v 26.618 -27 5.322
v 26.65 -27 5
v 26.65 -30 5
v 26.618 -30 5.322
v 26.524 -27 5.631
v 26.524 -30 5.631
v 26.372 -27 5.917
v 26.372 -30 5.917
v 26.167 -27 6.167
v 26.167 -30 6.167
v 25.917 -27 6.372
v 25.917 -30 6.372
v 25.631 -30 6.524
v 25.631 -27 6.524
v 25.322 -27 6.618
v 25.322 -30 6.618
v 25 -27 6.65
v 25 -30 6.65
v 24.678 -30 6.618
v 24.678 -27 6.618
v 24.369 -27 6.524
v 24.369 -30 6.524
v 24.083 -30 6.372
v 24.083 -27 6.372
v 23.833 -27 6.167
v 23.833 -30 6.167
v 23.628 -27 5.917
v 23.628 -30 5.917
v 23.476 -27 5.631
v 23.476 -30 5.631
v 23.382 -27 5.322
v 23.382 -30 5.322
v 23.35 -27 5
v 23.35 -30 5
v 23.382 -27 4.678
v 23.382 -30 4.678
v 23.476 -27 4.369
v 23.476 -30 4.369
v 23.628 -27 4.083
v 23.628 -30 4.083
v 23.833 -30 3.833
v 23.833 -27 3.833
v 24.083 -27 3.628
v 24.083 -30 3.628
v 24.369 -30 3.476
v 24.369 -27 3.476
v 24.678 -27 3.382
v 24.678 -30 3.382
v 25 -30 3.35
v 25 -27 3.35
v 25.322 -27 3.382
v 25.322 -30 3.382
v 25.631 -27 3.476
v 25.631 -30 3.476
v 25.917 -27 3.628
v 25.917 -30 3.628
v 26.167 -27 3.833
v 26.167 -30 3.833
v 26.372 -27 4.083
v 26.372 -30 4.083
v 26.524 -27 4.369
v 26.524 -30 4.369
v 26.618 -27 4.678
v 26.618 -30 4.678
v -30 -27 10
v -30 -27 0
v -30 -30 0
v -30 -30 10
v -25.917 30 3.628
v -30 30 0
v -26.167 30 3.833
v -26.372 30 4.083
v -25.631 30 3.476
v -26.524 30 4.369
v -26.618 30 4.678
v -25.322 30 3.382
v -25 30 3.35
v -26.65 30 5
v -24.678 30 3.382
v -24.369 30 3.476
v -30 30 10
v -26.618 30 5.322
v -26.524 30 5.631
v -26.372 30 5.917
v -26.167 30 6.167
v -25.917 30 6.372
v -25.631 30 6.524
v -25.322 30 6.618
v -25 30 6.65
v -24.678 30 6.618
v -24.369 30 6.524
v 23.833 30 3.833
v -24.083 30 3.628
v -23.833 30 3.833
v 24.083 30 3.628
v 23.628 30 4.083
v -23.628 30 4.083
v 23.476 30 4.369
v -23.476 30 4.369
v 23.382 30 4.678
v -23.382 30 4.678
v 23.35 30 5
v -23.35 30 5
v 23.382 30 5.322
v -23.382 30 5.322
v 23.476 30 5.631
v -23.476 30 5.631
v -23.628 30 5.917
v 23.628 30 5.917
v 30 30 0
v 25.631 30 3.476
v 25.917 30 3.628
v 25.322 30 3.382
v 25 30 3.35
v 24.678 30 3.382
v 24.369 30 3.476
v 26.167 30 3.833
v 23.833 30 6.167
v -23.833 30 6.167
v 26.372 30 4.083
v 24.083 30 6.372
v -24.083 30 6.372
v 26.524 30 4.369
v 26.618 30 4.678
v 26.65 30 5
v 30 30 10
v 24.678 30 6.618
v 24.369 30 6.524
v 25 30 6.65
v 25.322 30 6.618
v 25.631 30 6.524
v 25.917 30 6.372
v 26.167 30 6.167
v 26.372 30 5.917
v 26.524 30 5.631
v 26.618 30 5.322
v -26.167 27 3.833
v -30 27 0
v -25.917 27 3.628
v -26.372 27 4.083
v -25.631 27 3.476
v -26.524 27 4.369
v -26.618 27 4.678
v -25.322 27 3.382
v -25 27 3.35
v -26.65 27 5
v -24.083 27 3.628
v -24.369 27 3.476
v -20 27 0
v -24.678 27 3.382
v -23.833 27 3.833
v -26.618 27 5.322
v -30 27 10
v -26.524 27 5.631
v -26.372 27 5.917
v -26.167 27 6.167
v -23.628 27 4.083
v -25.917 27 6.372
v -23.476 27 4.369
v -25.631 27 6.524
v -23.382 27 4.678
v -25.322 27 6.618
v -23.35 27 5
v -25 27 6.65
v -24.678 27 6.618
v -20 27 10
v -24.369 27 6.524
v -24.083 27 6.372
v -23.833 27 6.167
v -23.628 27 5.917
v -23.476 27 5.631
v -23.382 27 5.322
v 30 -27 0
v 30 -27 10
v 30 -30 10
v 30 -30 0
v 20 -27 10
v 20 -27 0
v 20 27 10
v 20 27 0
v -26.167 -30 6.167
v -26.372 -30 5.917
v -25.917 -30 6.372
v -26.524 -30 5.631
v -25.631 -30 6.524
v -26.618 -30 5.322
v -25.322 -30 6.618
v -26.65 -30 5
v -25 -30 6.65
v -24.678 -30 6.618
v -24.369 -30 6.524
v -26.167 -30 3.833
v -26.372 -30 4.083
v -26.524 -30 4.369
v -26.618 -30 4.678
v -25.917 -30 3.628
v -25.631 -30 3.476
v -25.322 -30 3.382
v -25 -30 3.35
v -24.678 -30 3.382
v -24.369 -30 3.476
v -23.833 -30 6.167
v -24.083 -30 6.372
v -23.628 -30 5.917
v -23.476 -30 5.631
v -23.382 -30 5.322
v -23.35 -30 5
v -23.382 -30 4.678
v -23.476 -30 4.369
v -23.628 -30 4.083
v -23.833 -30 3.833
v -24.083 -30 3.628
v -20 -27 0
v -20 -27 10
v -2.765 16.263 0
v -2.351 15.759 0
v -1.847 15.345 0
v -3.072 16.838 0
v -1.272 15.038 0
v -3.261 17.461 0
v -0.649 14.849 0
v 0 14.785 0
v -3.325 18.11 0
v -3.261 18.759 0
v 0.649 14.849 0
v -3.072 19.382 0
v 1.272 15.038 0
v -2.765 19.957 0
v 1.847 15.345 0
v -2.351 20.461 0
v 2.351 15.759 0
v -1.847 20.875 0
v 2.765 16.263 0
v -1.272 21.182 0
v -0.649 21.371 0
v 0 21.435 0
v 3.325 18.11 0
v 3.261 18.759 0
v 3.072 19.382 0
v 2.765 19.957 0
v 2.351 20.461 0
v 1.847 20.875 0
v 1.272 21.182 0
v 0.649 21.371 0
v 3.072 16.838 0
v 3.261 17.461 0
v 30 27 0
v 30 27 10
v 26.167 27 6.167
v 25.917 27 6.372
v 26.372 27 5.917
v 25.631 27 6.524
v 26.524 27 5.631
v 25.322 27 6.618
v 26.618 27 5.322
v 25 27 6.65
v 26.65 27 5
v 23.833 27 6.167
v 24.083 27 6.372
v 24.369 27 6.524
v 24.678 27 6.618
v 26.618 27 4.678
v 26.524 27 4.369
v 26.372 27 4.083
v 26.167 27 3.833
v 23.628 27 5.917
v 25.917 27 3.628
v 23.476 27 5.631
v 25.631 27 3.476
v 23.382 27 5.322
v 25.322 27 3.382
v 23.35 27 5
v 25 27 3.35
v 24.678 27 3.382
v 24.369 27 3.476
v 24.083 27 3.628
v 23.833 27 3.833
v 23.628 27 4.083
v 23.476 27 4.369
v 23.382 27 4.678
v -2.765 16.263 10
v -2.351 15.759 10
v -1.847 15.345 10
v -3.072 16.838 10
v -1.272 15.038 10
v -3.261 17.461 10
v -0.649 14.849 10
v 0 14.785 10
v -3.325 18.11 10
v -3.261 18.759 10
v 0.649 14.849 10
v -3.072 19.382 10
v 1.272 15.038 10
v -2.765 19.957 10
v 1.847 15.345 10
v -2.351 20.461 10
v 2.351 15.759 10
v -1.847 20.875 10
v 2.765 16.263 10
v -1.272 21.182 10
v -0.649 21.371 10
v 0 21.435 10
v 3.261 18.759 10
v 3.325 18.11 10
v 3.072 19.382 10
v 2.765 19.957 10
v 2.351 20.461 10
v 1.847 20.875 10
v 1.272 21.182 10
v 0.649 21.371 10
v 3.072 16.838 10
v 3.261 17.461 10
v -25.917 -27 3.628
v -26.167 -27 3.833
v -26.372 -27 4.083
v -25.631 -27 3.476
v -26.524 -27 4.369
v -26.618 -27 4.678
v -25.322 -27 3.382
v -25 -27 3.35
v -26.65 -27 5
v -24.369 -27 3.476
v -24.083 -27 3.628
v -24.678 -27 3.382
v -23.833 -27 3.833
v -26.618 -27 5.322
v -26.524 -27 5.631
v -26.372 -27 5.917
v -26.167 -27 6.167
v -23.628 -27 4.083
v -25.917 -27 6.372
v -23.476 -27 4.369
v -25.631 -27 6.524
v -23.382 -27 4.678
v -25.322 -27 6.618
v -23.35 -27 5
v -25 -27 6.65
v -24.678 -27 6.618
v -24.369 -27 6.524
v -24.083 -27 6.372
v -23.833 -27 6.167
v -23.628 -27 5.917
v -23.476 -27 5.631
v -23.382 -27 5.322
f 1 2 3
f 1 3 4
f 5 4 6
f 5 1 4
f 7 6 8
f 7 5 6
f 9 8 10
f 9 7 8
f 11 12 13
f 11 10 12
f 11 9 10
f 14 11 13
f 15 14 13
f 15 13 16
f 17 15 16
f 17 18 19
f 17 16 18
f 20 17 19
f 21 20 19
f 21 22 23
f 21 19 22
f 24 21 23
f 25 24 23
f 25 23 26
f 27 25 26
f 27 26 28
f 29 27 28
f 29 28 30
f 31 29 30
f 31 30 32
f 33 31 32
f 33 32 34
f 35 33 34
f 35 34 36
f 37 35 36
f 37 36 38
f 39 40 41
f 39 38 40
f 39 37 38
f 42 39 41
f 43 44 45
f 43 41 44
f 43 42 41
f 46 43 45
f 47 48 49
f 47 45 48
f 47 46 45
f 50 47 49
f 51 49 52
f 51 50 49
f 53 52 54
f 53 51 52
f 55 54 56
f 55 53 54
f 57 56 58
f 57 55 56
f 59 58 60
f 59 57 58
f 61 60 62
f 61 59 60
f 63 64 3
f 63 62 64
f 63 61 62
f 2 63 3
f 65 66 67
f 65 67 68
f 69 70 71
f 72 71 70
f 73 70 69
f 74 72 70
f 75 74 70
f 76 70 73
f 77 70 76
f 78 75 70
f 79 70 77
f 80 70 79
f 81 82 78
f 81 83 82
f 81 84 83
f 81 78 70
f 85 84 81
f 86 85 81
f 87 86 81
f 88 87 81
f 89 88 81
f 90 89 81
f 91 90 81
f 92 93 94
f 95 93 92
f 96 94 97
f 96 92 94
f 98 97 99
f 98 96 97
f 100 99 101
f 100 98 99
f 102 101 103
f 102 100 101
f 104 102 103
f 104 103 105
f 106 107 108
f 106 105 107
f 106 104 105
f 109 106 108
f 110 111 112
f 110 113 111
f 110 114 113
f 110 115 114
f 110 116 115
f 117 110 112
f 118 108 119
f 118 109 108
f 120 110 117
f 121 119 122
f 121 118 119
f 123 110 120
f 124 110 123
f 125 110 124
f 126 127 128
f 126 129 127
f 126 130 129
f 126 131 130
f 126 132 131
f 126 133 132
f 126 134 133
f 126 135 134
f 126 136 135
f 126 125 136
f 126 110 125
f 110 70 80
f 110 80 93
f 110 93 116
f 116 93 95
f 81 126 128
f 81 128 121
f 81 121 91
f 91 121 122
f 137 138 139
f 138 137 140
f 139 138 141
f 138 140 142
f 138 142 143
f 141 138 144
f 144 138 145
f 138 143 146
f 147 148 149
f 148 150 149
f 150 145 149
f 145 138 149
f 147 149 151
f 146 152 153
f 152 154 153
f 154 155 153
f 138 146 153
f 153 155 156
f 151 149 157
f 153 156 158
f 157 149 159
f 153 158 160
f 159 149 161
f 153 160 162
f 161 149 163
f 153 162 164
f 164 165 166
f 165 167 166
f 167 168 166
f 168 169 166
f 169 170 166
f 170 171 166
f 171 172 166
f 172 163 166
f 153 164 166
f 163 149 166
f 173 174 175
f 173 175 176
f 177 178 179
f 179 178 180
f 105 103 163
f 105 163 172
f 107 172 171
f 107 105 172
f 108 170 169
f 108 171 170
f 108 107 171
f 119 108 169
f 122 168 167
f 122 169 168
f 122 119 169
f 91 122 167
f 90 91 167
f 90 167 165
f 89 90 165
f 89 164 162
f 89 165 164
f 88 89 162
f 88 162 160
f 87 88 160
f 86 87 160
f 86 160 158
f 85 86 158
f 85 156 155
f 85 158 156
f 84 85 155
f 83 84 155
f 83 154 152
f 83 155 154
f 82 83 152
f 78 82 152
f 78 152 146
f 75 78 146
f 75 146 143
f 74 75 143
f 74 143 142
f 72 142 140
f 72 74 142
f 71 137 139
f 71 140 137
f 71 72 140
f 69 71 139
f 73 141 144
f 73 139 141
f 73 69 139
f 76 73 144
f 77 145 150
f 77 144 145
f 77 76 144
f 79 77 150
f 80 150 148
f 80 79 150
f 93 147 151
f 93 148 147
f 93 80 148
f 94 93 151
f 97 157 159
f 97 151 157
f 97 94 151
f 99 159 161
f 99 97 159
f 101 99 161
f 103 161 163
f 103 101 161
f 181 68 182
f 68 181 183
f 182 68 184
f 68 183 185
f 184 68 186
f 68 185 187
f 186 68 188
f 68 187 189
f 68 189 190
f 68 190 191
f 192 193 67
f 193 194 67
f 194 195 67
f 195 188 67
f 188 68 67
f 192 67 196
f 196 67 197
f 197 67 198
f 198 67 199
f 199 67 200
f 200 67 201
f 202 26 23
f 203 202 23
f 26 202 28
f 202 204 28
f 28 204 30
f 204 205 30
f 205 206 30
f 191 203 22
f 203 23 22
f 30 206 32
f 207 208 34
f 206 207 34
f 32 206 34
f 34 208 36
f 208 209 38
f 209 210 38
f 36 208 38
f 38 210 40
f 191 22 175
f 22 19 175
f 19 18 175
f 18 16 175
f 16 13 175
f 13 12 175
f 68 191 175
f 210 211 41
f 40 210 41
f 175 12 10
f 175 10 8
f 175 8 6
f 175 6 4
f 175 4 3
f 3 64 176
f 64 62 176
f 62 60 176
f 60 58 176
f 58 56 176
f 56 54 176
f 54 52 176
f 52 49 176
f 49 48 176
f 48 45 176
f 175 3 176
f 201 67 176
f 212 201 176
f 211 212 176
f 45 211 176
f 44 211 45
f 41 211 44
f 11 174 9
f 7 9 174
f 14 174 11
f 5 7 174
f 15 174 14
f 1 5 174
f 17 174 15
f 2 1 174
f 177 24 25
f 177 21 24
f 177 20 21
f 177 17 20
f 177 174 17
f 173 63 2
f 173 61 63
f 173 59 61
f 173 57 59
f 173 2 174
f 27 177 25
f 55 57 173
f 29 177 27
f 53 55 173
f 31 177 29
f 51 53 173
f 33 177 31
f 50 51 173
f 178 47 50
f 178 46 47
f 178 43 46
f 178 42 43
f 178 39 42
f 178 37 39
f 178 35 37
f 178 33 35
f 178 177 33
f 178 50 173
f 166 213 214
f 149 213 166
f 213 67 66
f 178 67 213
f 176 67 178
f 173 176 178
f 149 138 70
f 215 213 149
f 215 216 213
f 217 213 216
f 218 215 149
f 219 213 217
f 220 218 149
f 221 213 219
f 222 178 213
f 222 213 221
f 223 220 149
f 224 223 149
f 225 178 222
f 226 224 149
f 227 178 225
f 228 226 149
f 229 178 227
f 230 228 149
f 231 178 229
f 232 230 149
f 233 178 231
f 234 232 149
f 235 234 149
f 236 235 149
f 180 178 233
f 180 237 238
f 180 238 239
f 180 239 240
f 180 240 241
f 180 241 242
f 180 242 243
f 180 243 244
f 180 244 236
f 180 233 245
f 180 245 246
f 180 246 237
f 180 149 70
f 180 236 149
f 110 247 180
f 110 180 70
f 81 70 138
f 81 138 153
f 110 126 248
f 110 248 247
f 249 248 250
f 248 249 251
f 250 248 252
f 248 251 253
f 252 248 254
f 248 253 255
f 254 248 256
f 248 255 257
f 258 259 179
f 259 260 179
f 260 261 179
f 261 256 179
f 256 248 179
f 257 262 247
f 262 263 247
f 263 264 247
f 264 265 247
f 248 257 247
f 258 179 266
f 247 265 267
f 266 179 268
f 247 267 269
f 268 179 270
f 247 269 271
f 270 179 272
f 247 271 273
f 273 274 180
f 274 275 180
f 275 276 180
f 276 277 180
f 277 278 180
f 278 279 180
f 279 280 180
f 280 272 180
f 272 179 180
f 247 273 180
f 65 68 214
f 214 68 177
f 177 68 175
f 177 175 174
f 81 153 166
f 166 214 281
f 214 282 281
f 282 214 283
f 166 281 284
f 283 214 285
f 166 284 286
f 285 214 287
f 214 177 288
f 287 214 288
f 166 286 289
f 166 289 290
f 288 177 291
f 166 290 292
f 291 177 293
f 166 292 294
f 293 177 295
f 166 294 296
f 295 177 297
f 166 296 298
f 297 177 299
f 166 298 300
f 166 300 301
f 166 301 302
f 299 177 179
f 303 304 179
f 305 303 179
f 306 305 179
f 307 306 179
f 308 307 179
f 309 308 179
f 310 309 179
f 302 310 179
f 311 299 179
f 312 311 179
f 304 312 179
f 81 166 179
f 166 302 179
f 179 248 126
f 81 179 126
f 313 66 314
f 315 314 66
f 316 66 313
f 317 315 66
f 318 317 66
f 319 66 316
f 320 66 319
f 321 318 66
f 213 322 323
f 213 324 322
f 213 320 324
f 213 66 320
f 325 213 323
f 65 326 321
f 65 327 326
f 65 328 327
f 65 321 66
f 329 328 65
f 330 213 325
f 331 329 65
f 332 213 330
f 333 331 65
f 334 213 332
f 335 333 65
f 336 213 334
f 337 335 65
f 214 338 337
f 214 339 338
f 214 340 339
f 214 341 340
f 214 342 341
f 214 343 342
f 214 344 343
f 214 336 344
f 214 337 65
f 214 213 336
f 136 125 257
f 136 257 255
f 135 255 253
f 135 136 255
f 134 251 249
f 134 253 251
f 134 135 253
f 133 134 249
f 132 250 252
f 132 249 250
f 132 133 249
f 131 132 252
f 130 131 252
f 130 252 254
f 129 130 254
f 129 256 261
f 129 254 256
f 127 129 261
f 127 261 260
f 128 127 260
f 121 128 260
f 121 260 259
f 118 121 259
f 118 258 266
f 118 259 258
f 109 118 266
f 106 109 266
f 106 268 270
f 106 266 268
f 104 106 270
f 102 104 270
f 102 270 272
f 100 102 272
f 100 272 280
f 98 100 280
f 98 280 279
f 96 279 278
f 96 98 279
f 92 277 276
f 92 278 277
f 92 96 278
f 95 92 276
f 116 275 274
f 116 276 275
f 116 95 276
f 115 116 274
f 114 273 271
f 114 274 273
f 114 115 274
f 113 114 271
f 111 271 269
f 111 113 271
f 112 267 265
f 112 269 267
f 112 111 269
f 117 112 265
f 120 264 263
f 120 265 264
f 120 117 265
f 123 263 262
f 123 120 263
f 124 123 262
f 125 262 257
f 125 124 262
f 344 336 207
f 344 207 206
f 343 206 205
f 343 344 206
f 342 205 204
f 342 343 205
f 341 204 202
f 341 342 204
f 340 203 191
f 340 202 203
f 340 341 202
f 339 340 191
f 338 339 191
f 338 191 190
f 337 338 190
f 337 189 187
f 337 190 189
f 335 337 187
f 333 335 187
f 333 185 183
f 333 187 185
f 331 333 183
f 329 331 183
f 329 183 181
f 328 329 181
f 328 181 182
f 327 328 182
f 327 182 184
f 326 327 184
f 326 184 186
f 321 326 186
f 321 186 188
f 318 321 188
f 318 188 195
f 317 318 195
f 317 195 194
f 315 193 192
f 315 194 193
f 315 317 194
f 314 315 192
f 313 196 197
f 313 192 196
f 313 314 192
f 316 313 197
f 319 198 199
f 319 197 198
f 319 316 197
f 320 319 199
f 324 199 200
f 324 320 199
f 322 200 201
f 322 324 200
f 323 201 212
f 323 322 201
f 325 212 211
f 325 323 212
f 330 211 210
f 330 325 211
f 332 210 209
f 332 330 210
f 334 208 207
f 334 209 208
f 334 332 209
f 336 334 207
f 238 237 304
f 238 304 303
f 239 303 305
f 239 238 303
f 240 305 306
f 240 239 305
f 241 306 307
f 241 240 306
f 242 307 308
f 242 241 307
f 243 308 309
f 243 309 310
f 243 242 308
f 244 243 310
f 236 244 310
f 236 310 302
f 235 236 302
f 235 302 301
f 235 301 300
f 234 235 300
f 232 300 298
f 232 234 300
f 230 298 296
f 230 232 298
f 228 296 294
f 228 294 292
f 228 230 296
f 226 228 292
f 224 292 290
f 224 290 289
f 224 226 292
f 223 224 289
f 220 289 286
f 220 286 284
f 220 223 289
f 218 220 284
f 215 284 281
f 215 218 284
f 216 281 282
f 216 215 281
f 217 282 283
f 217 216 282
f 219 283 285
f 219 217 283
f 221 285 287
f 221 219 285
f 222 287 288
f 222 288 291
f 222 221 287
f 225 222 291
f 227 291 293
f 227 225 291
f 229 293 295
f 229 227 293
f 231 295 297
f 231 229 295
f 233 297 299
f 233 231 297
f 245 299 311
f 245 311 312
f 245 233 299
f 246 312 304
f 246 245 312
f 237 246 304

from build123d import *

# Parameters (mm, degrees)
SKETCH1_W                    = 40
SKETCH1_H                    = 60
SKETCH1_R                    = 3.325
BOSS_EXTRUDE1_DEPTH          = 10
ESQUISSE1_W                  = 10
ESQUISSE1_H                  = 3
BOSS_EXTRU_1_DEPTH           = 10
ESQUISSE2_W                  = 10
ESQUISSE2_H                  = 3
BOSS_EXTRU_2_DEPTH           = 10
ENL_V_MAT_EXTRU_1_DEPTH      = 66.184353951
ENL_V_MAT_EXTRU_1_DEPTH_BACK = 66.184353951
ESQUISSE3_R                  = 1.65


with BuildPart() as part:
    # Sketch1 → Boss-Extrude1 (new body)
    with BuildSketch(Plane.XY):
        Rectangle(SKETCH1_W, SKETCH1_H)
        with Locations((0, 18.11)):
            Circle(SKETCH1_R, mode=Mode.SUBTRACT)
    extrude(amount=BOSS_EXTRUDE1_DEPTH)

    # Esquisse1 → Boss.-Extru.1 (add)
    with BuildSketch(Plane(origin=(20, 0, 0), x_dir=(0, 0, -1), z_dir=(1, 0, 0))):
        with Locations((-5, 28.5)):
            Rectangle(ESQUISSE1_W, ESQUISSE1_H)
        with Locations((-5, -28.5)):
            Rectangle(ESQUISSE1_W, ESQUISSE1_H)
    extrude(amount=BOSS_EXTRU_1_DEPTH)

    # Esquisse2 → Boss.-Extru.2 (add)
    with BuildSketch(Plane.ZY.offset(20)):
        with Locations((5, 28.5)):
            Rectangle(ESQUISSE2_W, ESQUISSE2_H)
        with Locations((5, -28.5)):
            Rectangle(ESQUISSE2_W, ESQUISSE2_H)
    extrude(amount=BOSS_EXTRU_2_DEPTH)

    # Esquisse3 → Enlèv. mat.-Extru.1 (cut, two sides: drawn at the far end of the back side and taken through both)
    with BuildSketch(Plane.XZ.offset(-27).offset(-ENL_V_MAT_EXTRU_1_DEPTH_BACK)):
        with Locations((-25, 5)):
            Circle(ESQUISSE3_R)
        with Locations((25, 5)):
            Circle(ESQUISSE3_R)
    extrude(amount=ENL_V_MAT_EXTRU_1_DEPTH + ENL_V_MAT_EXTRU_1_DEPTH_BACK, mode=Mode.SUBTRACT)


solid = part.part
